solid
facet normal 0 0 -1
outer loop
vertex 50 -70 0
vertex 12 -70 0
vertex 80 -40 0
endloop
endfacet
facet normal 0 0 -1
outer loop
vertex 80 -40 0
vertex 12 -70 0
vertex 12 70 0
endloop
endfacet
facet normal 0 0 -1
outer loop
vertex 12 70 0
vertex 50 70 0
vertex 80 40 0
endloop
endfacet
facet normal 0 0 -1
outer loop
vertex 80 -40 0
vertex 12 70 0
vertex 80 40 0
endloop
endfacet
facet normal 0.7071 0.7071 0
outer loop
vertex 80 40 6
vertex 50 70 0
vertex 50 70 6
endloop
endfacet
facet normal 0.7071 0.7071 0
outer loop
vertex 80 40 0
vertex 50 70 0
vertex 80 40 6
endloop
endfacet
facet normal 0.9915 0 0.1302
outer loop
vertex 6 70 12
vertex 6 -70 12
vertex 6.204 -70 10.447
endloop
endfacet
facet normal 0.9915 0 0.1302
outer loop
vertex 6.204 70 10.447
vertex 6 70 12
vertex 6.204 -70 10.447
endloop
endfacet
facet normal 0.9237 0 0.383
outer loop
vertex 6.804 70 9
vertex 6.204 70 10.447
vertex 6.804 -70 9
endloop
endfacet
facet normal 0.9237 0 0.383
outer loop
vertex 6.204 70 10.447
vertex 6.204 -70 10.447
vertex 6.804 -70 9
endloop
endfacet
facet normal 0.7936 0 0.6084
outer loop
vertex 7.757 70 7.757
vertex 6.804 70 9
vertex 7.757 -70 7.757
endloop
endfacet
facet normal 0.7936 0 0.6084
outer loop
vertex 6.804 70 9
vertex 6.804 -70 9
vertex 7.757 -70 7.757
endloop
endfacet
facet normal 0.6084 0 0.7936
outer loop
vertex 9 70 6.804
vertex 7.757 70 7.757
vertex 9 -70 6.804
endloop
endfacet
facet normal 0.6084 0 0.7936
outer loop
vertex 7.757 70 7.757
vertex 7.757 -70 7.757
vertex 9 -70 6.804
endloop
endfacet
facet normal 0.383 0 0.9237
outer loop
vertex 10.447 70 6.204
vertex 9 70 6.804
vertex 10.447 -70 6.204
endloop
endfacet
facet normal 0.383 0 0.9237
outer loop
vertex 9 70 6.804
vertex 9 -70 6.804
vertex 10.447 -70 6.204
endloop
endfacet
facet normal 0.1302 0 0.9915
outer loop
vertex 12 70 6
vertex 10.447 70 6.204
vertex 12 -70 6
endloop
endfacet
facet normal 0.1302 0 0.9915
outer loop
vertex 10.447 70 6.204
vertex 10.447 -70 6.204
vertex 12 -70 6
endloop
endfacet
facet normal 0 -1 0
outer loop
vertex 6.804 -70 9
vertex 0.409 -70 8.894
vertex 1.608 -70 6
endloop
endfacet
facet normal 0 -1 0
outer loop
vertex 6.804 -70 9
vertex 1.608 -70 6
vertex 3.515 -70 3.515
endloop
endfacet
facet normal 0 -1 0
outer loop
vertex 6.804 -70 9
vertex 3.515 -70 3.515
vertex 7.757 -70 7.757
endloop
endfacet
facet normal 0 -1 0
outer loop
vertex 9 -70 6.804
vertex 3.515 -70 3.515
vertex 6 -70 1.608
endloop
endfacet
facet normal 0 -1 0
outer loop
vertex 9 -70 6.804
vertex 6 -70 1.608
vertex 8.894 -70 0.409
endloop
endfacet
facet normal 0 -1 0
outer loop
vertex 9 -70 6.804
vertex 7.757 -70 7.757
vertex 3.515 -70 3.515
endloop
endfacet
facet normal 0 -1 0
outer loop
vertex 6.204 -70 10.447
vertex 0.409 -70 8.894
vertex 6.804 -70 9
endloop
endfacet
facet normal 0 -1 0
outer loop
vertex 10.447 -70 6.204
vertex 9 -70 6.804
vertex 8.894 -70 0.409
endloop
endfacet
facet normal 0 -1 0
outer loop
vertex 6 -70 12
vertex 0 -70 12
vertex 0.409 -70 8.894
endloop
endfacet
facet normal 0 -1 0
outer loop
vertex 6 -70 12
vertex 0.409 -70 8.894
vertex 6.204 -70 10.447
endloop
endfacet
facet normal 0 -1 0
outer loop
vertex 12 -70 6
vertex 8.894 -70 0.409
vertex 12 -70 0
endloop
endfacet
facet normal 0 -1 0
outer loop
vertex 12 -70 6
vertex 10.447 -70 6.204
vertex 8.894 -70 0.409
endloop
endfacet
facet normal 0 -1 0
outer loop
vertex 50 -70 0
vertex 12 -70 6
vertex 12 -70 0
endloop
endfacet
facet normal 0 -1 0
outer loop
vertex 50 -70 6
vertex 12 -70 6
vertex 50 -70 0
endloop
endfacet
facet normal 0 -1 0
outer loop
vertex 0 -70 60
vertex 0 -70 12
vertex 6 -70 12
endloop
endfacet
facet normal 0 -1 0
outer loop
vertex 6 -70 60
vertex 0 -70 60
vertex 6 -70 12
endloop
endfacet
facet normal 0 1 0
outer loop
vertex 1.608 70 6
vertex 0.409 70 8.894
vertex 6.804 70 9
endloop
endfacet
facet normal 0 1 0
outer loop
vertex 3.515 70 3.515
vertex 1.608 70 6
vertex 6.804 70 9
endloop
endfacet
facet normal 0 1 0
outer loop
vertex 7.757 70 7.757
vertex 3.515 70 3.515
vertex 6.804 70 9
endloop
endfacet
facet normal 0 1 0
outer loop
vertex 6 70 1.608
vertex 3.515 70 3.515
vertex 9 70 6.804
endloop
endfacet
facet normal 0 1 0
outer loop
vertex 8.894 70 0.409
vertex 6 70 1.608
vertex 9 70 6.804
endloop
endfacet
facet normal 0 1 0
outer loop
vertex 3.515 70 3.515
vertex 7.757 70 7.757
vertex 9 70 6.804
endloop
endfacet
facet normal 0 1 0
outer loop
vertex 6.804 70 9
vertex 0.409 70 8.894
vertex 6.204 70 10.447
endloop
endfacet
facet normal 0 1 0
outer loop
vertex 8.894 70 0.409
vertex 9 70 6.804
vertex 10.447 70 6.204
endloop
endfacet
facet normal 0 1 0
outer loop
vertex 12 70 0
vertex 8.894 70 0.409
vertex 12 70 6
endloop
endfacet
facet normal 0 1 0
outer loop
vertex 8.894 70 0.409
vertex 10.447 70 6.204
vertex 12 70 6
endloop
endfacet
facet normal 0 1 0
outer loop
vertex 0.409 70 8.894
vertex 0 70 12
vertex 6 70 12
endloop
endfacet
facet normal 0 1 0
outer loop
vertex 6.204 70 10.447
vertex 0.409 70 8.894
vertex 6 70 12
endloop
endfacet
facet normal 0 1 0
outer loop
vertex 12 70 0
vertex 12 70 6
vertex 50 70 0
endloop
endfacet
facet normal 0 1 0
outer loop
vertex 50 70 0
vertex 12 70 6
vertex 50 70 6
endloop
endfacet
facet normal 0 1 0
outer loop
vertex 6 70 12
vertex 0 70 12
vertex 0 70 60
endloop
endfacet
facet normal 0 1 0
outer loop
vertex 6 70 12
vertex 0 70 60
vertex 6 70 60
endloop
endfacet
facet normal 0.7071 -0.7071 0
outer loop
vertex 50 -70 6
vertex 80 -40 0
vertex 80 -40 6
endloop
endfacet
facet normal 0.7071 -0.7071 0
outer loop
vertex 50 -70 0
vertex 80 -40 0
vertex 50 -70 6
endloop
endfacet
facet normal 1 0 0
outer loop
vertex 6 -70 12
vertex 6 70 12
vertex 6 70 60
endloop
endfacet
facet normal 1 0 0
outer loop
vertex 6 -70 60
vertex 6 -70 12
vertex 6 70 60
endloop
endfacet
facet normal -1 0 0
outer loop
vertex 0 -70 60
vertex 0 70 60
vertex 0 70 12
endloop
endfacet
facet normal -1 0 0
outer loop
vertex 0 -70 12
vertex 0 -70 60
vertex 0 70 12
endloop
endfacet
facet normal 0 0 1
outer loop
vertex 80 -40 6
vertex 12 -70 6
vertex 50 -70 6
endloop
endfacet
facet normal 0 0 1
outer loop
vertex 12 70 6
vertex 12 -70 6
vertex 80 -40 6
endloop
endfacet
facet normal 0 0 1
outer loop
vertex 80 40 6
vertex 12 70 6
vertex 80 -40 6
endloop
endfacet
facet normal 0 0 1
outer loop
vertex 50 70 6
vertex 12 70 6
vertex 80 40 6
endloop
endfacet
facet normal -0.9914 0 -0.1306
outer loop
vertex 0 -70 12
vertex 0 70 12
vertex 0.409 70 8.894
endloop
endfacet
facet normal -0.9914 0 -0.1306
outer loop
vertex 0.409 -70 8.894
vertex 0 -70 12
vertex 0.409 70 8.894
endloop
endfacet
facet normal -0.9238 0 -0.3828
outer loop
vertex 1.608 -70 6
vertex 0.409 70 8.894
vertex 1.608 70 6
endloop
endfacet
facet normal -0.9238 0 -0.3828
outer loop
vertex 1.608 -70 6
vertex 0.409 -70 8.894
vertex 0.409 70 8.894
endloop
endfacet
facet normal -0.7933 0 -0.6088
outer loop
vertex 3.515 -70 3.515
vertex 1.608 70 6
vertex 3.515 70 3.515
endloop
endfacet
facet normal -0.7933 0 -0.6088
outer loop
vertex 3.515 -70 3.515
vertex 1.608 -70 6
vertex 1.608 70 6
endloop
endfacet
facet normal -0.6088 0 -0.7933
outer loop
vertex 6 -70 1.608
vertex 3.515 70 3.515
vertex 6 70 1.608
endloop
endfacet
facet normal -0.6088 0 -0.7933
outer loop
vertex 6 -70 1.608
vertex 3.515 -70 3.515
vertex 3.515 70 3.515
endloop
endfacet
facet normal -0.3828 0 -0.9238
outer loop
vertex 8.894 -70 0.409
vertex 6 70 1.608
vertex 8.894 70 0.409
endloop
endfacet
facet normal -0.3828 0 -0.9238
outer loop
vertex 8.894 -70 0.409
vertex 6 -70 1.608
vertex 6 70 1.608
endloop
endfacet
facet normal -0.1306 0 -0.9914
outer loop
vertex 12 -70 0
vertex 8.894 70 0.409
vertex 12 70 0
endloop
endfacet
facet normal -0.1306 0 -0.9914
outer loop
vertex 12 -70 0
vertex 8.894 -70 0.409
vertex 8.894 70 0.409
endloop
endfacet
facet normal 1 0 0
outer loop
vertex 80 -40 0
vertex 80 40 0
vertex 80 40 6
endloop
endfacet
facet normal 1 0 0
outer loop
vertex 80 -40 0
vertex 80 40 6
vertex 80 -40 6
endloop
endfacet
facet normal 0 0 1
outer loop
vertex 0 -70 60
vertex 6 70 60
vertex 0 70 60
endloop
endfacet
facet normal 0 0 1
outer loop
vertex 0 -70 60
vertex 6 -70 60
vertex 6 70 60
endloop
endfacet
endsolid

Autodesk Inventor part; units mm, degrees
ref_plane "YZ Plane" through (0, 0, 0) normal (1, 0, 0) x (0, 1, 0)
ref_plane "XZ Plane" through (0, 0, 0) normal (0, 1, 0) x (-1, 0, 0)
ref_plane "XY Plane" through (0, 0, 0) normal (0, 0, 1) x (1, 0, 0)
sketch "Sketch1" plane through (0, 0, 0) normal (0, 0, 1) x (1, 0, 0)
  line L0 (0, 70) -> (80, 70)
  line L1 (80, 70) -> (80, -70)
  line L2 (80, -70) -> (0, -70)
  line L3 (0, -70) -> (0, 70)
  line L4 (40, 70) -> (40, -70) construction
  line L5 (50, 70) -> (80, 40)
  line L6 (80, -40) -> (50, -70)
  point P0 (0, 0)
  point P1 (0, 0)
  dimension "d1" = 140
  dimension "d15" = 30
  dimension "d27" = 80
  dimension "d28" = 45
extrude "Plate1" add sketch "Sketch1" along normal blind 6 contours L0 L5 L1 L6 L2 L3
sketch "Sketch3" plane through (6, -70, 0) normal (-1, 0, 0) x (0, -1, 0)
  line L0 (-140, 0) -> (0, 0)
  line L1 (0, 0) -> (0, 60)
  line L2 (0, 60) -> (-140, 60)
  line L3 (-140, 60) -> (-140, 0)
edge flange "Flange1" height 60 angle 90 thickness 6 bend radius 6 thickness toward (-1, 0, 0) relief tear relief width 6 relief depth 3 edges at (0, 0, 6) wall of the first edge with corners at (6, 70, 0) (6, -70, 0) (6, -70, 60) (6, 70, 60)
bend "Bend1"
corner "Corner1"
equation "\"d2\" = Thickness"
equation "\"d17\" = BendReliefWidth"
equation "\"d18\" = BendReliefDepth"
equation "\"d19\" = MinimumRemnant"
equation "\"d20\" = TransitionRadius"
equation "\"d23\" = BendRadius"
equation "\"d24\" = CornerReliefSize"
equation "\"d25\" = GapSize"
equation "\"d26\" = JacobiRadiusSize"
equation "\"BendRadius\" = Thickness"
equation "\"BendReliefWidth\" = Thickness"
equation "\"BendReliefDepth\" = 0.5 * Thickness"
equation "\"CornerReliefSize\" = 4 * Thickness"
equation "\"MinimumRemnant\" = 2 * Thickness"
equation "\"TransitionRadius\" = BendRadius"
equation "\"JacobiRadiusSize\" = BendRadius"
equation "\"GapSize\" = Thickness"
equation "\"Thickness\" = 6"
properties part number "PNS-0812 floor ring  strengthen"
